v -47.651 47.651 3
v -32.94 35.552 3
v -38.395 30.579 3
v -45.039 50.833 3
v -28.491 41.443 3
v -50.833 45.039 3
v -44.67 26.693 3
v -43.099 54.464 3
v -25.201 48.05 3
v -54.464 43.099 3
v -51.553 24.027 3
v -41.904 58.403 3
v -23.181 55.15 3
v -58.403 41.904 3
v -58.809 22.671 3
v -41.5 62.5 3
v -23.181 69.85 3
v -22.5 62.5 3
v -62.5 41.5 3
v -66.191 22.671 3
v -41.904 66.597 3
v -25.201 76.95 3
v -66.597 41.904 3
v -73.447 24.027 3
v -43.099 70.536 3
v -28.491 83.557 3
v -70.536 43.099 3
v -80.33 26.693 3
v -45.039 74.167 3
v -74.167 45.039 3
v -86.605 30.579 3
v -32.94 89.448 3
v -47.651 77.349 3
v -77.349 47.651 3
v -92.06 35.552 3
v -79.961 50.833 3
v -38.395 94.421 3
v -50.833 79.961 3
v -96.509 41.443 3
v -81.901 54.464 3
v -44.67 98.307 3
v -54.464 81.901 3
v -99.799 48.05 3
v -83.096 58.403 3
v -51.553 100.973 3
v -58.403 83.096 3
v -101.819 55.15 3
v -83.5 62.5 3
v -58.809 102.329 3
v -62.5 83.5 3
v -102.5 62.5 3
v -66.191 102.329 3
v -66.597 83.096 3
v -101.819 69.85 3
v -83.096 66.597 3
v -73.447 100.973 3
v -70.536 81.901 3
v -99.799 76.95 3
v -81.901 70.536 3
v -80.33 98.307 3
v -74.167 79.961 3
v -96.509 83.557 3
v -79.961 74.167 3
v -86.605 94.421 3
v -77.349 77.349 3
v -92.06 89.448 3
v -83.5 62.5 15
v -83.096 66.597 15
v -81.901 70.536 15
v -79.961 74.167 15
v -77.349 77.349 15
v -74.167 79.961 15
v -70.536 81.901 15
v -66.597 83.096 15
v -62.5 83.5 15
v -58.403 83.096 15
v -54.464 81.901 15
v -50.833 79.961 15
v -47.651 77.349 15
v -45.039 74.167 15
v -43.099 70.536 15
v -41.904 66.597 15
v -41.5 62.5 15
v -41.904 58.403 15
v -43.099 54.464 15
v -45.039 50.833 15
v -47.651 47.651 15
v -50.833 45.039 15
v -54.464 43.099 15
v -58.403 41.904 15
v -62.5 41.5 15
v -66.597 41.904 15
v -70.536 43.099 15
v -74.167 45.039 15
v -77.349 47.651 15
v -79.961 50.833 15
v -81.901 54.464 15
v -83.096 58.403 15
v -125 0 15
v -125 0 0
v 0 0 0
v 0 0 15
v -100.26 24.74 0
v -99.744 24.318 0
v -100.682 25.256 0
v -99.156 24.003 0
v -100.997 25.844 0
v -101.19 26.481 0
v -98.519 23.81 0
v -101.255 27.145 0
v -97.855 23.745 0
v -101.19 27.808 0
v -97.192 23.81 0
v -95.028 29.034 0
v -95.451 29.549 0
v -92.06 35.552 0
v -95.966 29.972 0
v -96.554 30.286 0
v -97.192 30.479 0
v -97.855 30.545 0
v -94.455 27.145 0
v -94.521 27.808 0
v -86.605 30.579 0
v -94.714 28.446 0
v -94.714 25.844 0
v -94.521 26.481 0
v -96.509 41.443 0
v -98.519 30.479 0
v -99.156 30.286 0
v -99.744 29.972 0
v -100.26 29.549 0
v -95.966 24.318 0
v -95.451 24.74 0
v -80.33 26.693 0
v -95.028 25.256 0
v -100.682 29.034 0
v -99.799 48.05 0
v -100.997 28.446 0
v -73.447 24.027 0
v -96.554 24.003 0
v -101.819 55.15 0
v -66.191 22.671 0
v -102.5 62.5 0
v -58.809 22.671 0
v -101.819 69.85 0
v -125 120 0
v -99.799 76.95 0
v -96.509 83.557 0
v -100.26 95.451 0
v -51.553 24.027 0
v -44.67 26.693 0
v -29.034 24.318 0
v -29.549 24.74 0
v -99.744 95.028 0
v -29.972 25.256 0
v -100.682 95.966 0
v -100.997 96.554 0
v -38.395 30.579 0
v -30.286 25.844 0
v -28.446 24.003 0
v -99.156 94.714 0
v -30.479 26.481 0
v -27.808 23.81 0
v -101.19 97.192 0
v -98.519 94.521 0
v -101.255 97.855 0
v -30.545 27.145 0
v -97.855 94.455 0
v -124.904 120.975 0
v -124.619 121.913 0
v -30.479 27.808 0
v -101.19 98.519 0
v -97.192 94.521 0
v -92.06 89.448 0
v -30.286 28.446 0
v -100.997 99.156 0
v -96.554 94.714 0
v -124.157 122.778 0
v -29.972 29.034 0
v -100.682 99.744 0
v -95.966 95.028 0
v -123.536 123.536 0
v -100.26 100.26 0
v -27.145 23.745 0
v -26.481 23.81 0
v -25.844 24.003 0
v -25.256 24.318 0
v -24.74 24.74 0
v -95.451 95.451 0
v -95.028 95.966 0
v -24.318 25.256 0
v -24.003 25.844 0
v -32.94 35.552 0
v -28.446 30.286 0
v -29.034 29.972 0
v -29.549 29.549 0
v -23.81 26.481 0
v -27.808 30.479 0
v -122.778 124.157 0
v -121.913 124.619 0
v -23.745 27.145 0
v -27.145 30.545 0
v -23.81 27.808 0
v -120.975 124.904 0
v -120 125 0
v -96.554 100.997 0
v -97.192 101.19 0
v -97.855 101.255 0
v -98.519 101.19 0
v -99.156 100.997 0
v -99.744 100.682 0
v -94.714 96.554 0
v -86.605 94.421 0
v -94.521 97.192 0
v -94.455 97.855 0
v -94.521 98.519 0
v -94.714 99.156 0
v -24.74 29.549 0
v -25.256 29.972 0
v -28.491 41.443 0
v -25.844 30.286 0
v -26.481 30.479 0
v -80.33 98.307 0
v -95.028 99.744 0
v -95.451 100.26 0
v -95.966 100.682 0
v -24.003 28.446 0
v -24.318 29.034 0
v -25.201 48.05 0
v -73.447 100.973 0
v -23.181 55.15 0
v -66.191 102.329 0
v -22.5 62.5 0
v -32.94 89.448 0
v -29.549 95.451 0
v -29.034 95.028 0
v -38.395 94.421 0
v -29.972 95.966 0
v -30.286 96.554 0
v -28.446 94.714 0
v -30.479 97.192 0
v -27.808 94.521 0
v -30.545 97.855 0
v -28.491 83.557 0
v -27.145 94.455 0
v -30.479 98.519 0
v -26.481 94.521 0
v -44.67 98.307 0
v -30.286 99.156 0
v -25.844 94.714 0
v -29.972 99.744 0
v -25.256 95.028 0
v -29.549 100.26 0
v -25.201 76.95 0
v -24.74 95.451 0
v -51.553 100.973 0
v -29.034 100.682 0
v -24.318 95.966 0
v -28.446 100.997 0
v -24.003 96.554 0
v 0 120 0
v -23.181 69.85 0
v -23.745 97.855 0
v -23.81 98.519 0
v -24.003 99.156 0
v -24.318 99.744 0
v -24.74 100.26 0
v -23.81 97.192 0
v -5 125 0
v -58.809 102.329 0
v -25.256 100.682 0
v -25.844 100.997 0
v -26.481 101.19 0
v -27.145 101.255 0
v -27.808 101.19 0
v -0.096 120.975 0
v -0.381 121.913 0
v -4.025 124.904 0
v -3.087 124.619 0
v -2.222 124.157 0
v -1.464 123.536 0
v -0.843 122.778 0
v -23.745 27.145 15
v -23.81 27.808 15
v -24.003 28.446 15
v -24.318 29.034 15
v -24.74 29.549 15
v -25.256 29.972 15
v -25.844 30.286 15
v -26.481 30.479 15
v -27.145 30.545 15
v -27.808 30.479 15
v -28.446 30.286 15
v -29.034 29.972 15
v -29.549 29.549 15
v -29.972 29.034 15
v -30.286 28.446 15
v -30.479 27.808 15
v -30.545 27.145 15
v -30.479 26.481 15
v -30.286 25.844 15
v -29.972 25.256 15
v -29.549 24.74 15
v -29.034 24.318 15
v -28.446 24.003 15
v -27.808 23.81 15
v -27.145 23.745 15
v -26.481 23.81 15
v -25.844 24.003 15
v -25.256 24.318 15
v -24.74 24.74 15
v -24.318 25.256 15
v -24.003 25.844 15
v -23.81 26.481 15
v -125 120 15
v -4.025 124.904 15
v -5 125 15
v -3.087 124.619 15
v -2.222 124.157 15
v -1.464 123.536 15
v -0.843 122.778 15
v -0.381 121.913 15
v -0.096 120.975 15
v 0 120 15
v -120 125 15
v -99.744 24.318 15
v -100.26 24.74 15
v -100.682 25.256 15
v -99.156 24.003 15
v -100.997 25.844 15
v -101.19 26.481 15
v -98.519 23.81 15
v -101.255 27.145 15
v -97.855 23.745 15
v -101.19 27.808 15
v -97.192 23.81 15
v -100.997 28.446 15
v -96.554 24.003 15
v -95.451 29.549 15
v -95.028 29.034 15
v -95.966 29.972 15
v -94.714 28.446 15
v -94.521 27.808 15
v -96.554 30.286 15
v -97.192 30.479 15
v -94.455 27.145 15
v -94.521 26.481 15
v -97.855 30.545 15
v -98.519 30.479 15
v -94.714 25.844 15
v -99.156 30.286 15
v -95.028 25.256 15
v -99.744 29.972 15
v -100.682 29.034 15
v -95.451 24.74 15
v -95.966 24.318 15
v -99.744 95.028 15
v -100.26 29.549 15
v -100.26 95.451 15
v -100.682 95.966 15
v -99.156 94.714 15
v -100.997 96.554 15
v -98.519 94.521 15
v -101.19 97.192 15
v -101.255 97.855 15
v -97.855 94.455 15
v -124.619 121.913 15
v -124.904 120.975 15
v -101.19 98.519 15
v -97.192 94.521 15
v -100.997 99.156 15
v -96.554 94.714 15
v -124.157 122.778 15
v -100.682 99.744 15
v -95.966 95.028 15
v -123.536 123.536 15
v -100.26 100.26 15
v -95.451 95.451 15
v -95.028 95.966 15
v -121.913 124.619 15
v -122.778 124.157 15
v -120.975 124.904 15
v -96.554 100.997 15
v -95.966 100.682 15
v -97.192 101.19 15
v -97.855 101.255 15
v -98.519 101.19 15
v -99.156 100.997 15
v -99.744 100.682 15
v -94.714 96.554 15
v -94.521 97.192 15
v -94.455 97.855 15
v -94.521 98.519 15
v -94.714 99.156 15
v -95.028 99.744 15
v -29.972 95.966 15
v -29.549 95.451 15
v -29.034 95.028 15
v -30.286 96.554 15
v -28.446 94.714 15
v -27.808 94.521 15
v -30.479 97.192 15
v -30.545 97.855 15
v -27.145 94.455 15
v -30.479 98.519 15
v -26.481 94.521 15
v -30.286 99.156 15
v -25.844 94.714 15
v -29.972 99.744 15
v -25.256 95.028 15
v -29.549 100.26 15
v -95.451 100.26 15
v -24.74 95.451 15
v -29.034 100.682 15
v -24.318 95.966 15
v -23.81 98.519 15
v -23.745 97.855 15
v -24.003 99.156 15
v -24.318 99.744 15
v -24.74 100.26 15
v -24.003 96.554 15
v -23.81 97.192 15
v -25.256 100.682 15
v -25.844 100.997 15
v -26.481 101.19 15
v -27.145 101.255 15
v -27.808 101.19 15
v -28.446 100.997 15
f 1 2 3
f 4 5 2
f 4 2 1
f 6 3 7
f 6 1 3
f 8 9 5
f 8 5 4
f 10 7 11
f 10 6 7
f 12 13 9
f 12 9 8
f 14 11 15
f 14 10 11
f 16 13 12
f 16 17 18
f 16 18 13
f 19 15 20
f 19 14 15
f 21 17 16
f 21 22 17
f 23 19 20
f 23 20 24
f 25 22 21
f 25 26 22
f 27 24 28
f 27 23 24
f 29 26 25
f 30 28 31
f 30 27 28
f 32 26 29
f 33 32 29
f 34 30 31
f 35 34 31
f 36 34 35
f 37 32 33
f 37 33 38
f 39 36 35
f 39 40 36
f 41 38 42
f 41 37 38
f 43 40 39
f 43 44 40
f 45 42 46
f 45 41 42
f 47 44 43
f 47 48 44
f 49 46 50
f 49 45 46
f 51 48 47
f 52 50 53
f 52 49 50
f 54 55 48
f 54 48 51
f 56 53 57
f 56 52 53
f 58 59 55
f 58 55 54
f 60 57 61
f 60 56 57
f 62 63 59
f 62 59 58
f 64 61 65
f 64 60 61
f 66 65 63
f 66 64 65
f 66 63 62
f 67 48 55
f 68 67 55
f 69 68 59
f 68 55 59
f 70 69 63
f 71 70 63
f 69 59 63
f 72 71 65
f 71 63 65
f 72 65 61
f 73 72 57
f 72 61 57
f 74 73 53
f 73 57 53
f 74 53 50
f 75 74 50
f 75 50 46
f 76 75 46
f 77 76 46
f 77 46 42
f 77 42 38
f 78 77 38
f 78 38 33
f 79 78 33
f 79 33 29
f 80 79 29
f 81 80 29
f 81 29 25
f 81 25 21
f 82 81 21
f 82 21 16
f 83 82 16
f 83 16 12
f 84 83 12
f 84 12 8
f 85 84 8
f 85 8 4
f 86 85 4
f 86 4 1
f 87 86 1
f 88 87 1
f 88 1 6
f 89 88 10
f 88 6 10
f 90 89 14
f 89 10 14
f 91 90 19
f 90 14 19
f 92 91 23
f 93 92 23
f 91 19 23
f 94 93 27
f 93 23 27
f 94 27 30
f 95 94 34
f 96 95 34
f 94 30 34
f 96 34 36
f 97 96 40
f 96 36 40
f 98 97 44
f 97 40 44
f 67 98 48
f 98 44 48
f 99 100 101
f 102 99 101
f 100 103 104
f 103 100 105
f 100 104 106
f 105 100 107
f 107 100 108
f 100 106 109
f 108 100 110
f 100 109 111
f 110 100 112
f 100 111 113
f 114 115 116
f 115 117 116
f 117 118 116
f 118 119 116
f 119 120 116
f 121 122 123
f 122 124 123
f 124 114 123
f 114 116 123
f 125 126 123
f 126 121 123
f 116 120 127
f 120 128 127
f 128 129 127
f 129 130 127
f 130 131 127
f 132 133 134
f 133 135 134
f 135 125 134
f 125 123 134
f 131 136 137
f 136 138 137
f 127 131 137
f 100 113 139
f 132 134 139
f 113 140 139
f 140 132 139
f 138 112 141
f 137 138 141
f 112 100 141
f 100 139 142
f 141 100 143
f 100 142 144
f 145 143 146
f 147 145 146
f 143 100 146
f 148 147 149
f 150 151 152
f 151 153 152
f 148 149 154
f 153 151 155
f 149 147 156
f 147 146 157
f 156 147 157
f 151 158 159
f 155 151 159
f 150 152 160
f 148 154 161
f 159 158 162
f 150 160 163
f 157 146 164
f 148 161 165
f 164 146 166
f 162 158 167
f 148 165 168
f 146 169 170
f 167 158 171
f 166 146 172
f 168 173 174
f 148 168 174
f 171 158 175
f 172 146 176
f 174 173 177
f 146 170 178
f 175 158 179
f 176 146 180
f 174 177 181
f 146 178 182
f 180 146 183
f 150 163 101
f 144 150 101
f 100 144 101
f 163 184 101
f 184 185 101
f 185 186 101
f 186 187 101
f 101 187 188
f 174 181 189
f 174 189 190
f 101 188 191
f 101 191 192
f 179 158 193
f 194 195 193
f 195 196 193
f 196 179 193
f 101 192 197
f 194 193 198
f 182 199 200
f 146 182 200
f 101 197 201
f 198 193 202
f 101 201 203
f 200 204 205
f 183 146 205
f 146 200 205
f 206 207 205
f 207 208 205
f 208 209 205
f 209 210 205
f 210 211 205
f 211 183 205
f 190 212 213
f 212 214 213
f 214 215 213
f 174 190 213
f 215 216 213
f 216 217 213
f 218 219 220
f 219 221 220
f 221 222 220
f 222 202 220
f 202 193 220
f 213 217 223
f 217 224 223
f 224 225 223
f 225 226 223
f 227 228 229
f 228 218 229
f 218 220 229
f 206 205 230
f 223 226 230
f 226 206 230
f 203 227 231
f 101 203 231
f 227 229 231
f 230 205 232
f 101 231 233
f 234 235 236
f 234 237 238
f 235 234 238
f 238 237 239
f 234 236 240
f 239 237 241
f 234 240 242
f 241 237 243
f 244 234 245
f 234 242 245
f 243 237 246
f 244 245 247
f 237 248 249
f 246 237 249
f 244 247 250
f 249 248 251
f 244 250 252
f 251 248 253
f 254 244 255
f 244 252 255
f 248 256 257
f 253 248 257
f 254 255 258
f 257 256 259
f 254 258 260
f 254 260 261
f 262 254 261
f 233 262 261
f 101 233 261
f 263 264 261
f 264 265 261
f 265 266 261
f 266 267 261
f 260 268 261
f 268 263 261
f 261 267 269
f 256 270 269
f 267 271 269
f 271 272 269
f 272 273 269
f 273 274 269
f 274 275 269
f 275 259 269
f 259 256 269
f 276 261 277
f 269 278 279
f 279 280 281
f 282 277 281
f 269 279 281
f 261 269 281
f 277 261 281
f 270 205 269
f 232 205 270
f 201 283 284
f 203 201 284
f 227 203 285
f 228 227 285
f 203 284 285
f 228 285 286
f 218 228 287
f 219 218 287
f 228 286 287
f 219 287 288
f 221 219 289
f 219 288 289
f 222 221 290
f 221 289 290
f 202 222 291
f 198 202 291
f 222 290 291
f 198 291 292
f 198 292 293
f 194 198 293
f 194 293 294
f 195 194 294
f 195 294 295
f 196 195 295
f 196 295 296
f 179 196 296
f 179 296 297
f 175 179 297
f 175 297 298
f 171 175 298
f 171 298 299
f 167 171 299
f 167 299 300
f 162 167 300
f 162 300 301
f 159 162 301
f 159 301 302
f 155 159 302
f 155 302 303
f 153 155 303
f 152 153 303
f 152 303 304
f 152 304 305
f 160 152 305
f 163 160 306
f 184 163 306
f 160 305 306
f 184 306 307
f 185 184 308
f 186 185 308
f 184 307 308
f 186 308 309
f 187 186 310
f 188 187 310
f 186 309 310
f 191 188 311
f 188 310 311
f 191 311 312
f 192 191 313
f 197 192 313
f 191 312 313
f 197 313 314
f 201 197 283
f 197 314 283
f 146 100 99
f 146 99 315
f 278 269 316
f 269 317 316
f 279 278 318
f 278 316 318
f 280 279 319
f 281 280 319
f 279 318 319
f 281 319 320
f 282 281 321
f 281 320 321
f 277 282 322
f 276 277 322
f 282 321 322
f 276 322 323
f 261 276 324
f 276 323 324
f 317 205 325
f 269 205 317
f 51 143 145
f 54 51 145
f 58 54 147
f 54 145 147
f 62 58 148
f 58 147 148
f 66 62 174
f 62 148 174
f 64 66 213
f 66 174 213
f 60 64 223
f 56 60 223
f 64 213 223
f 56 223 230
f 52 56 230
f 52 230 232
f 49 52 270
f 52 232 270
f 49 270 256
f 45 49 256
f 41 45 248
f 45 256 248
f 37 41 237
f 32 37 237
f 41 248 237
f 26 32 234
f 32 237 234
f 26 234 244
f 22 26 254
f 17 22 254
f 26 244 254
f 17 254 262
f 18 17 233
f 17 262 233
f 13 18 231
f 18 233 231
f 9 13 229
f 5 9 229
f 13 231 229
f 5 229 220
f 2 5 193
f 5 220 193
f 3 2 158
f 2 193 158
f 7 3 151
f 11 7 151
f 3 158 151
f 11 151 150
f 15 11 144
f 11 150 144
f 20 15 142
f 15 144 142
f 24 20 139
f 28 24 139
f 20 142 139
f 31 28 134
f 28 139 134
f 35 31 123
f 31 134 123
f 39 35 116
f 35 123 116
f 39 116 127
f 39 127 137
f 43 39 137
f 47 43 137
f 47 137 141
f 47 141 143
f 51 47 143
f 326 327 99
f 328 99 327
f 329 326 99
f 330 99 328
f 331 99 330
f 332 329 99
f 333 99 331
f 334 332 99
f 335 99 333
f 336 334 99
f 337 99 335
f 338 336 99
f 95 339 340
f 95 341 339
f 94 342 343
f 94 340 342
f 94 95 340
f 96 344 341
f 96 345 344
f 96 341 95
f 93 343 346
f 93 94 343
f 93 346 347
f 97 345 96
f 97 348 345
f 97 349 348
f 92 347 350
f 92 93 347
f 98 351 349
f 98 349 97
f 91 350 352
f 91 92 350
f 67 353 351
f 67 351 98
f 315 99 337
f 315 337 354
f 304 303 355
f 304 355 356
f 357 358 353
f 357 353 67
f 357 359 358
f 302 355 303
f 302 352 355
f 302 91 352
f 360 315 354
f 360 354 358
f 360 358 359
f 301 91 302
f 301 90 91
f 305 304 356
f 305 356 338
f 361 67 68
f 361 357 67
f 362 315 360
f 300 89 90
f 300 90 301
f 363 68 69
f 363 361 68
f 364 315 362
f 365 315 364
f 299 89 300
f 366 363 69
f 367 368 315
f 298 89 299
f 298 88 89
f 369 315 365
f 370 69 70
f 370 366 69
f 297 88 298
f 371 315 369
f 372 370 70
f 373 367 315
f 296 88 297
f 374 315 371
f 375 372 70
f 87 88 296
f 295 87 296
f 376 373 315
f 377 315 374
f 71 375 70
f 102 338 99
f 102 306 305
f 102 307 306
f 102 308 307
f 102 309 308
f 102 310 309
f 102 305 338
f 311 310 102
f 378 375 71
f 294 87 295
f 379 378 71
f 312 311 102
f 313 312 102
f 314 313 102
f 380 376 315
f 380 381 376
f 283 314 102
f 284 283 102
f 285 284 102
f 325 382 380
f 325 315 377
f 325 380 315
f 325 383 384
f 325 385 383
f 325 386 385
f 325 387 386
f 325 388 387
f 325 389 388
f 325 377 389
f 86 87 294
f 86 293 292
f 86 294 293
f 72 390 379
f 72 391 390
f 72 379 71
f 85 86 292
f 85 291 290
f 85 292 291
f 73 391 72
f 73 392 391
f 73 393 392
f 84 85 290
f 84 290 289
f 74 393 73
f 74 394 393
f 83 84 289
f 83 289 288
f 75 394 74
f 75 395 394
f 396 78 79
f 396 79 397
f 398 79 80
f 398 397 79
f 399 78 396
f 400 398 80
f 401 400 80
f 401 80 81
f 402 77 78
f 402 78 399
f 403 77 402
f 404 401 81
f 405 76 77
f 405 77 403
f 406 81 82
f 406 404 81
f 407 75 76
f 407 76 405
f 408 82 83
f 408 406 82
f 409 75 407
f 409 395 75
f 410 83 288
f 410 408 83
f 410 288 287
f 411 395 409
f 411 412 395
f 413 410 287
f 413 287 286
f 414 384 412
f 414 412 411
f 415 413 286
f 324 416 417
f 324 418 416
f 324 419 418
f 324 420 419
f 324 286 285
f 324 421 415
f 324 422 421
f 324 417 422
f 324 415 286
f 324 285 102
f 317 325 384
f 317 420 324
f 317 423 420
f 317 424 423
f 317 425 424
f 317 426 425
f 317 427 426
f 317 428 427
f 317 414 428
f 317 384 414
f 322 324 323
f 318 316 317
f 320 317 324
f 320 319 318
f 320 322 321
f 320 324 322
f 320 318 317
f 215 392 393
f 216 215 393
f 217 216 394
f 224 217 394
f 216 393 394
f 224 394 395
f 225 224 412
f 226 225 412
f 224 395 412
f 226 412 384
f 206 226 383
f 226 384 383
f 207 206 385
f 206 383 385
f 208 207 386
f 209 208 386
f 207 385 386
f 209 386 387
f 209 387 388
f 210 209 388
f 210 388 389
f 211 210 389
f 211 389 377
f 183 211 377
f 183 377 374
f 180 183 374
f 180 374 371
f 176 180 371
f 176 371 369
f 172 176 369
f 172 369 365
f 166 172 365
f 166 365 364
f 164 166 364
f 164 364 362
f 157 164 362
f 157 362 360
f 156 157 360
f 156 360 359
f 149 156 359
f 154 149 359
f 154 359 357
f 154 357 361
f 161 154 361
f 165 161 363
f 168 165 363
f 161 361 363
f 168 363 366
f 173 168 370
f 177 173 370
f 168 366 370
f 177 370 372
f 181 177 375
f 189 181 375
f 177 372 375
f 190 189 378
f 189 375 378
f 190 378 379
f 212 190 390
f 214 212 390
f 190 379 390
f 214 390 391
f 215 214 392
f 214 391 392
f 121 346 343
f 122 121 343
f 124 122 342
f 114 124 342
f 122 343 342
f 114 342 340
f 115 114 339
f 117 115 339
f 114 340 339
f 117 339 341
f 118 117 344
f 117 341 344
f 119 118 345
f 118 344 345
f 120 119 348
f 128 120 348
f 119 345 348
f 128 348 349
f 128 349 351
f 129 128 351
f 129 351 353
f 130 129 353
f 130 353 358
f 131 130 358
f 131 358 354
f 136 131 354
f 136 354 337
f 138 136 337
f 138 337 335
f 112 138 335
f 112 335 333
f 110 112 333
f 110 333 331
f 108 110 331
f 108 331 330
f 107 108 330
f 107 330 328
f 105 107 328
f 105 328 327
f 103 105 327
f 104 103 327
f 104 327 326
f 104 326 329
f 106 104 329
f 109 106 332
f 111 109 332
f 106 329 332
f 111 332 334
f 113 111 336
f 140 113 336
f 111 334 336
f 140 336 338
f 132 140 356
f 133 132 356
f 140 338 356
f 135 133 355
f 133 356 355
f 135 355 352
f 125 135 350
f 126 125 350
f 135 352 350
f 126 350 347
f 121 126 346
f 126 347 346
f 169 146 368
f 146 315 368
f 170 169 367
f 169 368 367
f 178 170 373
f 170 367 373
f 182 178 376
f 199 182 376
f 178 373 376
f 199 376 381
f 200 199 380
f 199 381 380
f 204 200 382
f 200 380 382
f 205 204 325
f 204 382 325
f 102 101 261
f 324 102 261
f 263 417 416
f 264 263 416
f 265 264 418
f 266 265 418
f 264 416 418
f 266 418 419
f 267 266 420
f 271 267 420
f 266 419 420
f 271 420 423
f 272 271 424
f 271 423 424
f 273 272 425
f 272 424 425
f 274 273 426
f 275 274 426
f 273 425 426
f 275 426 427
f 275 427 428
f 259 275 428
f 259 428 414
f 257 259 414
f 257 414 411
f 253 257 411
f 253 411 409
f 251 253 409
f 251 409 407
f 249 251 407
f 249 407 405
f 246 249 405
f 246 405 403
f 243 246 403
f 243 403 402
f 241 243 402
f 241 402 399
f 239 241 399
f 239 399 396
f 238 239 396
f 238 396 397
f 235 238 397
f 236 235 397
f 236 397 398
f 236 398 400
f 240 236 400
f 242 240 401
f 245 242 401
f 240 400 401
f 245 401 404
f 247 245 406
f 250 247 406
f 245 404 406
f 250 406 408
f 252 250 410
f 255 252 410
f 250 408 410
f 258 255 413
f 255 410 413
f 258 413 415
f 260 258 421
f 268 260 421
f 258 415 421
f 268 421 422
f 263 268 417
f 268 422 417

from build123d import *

# Parameters (mm, degrees)
ESQUISSE1_W             = 125
ESQUISSE1_H             = 125
BOSS_EXTRU_1_DEPTH      = 15
ESQUISSE2_R             = 40
ENL_V_MAT_EXTRU_1_DEPTH = 3
CONG_1_R                = 5
ESQUISSE11_R            = 21
ENL_V_MAT_EXTRU_2_DEPTH = 15
TROU_TARAUD_M81_D       = 6.8
TROU_TARAUD_M81_DEPTH   = 22.25
TROU_TARAUD_M81_TIP     = 2.042926105


with BuildPart() as part:
    # Esquisse1 → Boss.-Extru.1 (new body)
    with BuildSketch(Plane.XY):
        with Locations((-62.5, 62.5)):
            Rectangle(ESQUISSE1_W, ESQUISSE1_H)
    extrude(amount=BOSS_EXTRU_1_DEPTH)

    # Esquisse2 → Enlèv. mat.-Extru.1 (cut)
    with BuildSketch(Plane(origin=(0, 0, 0), x_dir=(-1, 0, 0), z_dir=(0, 0, -1))):
        with Locations((62.5, 62.5)):
            Circle(ESQUISSE2_R)
    extrude(amount=-ENL_V_MAT_EXTRU_1_DEPTH, mode=Mode.SUBTRACT)

    # Congé1
    cong_1_edges = [part.edges().sort_by_distance(p)[0] for p in [
        (-125, 125, 7.5),
        (0, 125, 7.5),
    ]]
    fillet(cong_1_edges, radius=CONG_1_R)

    # Esquisse11 → Enlèv. mat.-Extru.2 (cut)
    with BuildSketch(Plane(origin=(0, 0, 3), x_dir=(-1, 0, 0), z_dir=(0, 0, -1))):
        with Locations((62.5, 62.5)):
            Circle(ESQUISSE11_R)
    extrude(amount=-ENL_V_MAT_EXTRU_2_DEPTH, mode=Mode.SUBTRACT)

    # Trou taraudé M81
    with Locations(Plane(origin=(0, 0, 0), x_dir=(-1, 0, 0), z_dir=(0, 0, -1))):
        with Locations((97.855339059, 97.855339059), (27.144660941, 97.855339059), (27.144660941, 27.144660941), (97.855339059, 27.144660941)):
            Hole(TROU_TARAUD_M81_D / 2, depth=TROU_TARAUD_M81_DEPTH)
            with Locations((0, 0, -(TROU_TARAUD_M81_DEPTH + TROU_TARAUD_M81_TIP / 2))):  # 118° drill point
                Cone(0, TROU_TARAUD_M81_D / 2, TROU_TARAUD_M81_TIP, mode=Mode.SUBTRACT)


solid = part.part
